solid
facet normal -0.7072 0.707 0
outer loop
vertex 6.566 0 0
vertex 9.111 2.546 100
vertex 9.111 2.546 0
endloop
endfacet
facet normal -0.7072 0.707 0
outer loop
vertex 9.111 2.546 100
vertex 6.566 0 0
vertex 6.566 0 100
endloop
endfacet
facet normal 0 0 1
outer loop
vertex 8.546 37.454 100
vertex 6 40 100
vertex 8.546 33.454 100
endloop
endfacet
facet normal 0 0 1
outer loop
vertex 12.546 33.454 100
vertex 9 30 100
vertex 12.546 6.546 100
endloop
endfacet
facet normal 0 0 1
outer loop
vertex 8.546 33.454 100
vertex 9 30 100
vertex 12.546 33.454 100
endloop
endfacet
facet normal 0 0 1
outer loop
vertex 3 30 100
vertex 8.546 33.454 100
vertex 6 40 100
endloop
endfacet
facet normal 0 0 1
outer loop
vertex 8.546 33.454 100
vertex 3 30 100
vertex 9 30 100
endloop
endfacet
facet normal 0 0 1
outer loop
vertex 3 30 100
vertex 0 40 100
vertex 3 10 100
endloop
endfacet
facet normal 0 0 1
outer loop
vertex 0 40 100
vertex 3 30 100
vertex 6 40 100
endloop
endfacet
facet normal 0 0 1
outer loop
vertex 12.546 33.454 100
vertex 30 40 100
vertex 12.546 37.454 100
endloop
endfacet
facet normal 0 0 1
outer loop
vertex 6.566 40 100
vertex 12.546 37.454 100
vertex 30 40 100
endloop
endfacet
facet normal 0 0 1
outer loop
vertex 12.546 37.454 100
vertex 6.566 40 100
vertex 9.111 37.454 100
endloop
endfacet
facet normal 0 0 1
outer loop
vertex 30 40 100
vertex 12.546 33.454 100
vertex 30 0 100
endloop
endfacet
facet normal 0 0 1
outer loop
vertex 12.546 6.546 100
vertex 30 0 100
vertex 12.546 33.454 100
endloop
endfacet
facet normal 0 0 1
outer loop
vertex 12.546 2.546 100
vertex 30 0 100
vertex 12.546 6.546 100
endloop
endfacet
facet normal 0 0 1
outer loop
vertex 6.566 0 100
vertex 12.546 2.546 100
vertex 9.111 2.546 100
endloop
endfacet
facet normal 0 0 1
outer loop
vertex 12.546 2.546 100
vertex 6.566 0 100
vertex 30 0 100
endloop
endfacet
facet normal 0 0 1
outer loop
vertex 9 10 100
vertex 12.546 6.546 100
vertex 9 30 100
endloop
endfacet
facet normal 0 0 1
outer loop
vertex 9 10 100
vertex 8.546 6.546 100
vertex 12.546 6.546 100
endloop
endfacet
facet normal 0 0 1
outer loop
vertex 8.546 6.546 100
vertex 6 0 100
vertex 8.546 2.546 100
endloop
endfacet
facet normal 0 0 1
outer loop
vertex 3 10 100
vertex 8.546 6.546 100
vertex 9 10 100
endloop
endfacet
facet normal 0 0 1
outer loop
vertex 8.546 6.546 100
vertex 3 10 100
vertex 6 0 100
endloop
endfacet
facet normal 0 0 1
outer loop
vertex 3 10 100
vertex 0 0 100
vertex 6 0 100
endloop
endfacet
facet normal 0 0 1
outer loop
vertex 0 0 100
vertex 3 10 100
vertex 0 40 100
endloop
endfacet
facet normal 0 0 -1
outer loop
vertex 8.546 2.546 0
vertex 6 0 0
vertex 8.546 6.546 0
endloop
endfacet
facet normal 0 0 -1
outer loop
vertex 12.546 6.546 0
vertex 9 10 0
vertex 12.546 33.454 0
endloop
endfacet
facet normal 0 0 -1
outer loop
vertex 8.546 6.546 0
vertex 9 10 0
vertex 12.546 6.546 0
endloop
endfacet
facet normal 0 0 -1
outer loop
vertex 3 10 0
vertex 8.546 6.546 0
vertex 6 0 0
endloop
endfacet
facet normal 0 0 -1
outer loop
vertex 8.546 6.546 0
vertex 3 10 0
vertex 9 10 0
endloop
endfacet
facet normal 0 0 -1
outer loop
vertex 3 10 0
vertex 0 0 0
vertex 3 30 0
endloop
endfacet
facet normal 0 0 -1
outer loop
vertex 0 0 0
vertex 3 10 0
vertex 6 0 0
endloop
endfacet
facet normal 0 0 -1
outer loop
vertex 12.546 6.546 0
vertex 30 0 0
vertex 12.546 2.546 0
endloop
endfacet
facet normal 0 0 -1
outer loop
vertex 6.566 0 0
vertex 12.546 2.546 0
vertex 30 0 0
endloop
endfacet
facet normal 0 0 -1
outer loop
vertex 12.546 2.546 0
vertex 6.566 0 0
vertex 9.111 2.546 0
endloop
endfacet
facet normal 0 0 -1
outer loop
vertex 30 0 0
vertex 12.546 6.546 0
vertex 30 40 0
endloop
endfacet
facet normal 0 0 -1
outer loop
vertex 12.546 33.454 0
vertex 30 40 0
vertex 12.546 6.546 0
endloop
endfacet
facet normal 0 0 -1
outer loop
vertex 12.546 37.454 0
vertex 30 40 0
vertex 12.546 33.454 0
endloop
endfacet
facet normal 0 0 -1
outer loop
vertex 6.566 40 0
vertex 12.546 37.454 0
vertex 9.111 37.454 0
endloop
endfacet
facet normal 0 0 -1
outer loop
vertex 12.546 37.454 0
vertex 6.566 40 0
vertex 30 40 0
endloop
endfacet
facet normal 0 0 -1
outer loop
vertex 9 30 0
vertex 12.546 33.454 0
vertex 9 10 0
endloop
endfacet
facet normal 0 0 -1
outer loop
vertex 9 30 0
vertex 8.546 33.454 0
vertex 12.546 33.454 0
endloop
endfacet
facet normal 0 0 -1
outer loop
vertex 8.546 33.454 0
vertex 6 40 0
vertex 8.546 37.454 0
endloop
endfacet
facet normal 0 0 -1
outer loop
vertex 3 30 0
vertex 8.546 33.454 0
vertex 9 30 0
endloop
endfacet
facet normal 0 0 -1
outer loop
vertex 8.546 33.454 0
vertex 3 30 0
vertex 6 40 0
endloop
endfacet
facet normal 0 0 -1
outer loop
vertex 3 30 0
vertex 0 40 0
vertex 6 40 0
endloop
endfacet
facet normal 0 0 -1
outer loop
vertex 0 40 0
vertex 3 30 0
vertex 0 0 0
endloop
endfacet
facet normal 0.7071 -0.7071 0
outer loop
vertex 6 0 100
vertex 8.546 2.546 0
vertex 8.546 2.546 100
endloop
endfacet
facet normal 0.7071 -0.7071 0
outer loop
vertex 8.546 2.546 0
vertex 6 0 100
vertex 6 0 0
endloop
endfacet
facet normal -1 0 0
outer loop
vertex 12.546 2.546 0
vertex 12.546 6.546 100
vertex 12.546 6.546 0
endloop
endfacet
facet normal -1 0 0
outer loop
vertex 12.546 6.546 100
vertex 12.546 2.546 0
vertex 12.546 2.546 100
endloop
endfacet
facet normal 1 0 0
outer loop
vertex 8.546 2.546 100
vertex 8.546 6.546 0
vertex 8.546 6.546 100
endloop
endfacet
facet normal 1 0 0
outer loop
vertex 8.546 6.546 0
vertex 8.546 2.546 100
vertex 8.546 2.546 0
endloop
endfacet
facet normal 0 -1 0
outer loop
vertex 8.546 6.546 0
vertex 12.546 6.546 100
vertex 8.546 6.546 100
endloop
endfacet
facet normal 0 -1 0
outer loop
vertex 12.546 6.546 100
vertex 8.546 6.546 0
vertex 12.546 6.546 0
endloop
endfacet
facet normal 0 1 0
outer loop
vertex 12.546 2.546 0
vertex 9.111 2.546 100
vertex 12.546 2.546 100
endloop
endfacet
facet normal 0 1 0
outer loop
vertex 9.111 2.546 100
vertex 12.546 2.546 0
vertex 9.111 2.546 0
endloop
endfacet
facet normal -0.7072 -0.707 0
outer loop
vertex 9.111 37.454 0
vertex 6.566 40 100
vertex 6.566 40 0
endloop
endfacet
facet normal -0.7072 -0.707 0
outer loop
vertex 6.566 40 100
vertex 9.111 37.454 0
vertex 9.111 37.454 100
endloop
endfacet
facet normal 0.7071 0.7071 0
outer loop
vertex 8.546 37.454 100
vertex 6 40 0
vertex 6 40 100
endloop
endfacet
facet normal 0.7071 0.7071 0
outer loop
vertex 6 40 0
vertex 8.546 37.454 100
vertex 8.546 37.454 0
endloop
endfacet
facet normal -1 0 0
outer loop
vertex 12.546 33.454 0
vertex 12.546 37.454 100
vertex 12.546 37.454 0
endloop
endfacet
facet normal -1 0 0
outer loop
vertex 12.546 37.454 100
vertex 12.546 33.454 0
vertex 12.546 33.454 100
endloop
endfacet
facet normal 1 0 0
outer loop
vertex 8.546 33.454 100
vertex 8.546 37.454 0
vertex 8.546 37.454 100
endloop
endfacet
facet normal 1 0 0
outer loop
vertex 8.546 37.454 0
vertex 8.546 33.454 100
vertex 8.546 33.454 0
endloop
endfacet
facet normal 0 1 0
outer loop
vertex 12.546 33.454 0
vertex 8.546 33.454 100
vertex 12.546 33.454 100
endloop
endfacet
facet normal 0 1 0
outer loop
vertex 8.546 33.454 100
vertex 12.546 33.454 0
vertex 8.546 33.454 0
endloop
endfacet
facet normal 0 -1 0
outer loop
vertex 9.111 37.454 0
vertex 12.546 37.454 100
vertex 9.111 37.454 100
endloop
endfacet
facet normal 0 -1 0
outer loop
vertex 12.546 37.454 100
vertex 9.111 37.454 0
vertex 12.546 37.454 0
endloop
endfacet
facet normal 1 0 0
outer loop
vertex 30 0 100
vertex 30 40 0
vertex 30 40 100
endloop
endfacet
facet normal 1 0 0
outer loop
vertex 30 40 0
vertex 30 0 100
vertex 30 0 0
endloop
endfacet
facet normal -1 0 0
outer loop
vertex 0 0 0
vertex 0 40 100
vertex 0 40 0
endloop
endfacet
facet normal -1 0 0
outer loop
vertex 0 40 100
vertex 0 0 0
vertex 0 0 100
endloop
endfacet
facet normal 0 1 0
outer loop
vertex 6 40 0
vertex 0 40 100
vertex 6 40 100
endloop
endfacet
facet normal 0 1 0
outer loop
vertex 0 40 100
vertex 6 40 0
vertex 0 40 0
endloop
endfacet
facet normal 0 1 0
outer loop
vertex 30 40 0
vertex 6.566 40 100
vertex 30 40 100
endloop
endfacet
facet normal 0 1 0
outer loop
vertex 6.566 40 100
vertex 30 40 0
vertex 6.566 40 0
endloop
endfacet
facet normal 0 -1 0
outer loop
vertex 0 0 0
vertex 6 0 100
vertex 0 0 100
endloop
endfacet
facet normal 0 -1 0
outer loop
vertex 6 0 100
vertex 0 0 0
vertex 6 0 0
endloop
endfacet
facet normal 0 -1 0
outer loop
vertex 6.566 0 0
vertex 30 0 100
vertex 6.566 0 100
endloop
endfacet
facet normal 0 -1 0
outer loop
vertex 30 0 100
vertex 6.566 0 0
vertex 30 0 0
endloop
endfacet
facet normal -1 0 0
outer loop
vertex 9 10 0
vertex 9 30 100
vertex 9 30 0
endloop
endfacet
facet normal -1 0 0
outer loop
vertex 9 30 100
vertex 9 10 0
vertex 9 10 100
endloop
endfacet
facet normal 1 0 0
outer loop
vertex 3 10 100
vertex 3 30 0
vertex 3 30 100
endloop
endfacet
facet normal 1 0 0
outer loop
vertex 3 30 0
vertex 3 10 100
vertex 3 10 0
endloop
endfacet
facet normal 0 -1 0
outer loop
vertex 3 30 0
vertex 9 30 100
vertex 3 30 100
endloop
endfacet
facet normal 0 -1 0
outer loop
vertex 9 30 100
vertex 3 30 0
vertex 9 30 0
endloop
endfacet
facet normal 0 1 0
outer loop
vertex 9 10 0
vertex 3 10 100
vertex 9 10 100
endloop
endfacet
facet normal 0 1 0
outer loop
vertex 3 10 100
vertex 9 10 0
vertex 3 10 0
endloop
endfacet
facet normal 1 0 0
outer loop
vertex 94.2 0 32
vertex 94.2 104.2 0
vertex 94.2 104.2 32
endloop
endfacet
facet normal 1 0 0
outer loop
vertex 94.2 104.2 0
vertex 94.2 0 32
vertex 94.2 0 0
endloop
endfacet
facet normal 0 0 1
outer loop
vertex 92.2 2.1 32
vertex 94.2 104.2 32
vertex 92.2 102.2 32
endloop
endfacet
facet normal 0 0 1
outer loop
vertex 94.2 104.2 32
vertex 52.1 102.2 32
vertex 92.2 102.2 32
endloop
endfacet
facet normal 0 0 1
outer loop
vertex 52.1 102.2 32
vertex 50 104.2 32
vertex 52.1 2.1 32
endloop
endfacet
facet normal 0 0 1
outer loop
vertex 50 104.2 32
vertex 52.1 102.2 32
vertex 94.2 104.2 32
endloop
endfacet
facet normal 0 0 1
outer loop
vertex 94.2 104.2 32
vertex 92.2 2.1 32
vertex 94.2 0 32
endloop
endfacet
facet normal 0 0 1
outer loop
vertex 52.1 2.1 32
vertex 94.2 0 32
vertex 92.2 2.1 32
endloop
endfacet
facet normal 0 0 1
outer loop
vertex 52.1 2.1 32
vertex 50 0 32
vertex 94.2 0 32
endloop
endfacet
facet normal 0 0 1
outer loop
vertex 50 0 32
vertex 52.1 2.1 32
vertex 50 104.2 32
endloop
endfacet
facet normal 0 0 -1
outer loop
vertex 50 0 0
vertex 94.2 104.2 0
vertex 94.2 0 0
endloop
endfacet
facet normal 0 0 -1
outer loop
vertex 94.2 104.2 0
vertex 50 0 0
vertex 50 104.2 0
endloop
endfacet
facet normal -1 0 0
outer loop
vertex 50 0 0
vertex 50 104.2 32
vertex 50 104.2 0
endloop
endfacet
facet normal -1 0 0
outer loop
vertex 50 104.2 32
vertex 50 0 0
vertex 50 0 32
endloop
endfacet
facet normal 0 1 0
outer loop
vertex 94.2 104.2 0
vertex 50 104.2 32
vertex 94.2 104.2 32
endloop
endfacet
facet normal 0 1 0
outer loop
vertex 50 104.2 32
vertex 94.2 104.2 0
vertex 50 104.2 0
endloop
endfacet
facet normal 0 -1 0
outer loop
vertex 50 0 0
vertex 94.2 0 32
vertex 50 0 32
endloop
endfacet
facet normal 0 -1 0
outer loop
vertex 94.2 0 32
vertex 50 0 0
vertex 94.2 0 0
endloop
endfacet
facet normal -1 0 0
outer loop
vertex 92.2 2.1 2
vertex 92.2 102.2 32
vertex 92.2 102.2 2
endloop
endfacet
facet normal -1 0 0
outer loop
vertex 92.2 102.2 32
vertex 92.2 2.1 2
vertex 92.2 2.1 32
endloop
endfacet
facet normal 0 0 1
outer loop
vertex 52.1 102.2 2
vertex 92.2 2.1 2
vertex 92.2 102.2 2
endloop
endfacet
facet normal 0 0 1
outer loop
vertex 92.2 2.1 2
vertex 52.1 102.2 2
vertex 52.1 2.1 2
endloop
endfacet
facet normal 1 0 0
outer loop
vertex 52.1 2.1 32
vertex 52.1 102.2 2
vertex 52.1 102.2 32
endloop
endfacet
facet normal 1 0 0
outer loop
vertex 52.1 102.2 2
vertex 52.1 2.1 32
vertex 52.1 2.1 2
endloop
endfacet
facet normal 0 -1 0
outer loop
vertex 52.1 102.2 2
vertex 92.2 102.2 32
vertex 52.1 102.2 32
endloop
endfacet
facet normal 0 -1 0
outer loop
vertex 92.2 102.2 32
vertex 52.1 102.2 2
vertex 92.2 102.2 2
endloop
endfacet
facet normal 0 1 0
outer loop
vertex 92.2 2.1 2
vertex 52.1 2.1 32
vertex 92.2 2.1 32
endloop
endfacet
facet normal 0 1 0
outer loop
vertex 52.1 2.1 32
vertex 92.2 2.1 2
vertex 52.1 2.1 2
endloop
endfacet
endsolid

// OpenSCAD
length = 100;
width = 40;
thickness = 30;


//Wiper.
module cutout() {
	rotate([0, 0, -45]) {
		cube([width * 0.01, width * 0.1, length]);
	}
	translate([width * 0.09 / sqrt(2), width * 0.09 / sqrt(2), 0]) {
		cube([width * 0.1, width * 0.1, length]);
	}
}
difference() {
	cube([thickness, width, length]);
	translate([thickness * 0.2, 0, 0]) {
		cutout();
	}
	translate([thickness * 0.2, width, 0]) {
		mirror([0, 1, 0]) {
			cutout();
		}
	}
	translate([thickness * 0.1, width * 0.25, 0]) {
		cube([thickness * 0.2, width * 0.5, length]);
	}
}

//Cover.
cover_thickness = 2;
play = 0.1;
translate([thickness + 20, 0, 0]) {
	difference() {
		cube([width + cover_thickness * 2 + play * 2, length + cover_thickness * 2 + play * 2, thickness + cover_thickness]);
		translate([cover_thickness + play, cover_thickness + play, cover_thickness]) {
			cube([width + play, length + play, thickness]);
		}
	}
}
